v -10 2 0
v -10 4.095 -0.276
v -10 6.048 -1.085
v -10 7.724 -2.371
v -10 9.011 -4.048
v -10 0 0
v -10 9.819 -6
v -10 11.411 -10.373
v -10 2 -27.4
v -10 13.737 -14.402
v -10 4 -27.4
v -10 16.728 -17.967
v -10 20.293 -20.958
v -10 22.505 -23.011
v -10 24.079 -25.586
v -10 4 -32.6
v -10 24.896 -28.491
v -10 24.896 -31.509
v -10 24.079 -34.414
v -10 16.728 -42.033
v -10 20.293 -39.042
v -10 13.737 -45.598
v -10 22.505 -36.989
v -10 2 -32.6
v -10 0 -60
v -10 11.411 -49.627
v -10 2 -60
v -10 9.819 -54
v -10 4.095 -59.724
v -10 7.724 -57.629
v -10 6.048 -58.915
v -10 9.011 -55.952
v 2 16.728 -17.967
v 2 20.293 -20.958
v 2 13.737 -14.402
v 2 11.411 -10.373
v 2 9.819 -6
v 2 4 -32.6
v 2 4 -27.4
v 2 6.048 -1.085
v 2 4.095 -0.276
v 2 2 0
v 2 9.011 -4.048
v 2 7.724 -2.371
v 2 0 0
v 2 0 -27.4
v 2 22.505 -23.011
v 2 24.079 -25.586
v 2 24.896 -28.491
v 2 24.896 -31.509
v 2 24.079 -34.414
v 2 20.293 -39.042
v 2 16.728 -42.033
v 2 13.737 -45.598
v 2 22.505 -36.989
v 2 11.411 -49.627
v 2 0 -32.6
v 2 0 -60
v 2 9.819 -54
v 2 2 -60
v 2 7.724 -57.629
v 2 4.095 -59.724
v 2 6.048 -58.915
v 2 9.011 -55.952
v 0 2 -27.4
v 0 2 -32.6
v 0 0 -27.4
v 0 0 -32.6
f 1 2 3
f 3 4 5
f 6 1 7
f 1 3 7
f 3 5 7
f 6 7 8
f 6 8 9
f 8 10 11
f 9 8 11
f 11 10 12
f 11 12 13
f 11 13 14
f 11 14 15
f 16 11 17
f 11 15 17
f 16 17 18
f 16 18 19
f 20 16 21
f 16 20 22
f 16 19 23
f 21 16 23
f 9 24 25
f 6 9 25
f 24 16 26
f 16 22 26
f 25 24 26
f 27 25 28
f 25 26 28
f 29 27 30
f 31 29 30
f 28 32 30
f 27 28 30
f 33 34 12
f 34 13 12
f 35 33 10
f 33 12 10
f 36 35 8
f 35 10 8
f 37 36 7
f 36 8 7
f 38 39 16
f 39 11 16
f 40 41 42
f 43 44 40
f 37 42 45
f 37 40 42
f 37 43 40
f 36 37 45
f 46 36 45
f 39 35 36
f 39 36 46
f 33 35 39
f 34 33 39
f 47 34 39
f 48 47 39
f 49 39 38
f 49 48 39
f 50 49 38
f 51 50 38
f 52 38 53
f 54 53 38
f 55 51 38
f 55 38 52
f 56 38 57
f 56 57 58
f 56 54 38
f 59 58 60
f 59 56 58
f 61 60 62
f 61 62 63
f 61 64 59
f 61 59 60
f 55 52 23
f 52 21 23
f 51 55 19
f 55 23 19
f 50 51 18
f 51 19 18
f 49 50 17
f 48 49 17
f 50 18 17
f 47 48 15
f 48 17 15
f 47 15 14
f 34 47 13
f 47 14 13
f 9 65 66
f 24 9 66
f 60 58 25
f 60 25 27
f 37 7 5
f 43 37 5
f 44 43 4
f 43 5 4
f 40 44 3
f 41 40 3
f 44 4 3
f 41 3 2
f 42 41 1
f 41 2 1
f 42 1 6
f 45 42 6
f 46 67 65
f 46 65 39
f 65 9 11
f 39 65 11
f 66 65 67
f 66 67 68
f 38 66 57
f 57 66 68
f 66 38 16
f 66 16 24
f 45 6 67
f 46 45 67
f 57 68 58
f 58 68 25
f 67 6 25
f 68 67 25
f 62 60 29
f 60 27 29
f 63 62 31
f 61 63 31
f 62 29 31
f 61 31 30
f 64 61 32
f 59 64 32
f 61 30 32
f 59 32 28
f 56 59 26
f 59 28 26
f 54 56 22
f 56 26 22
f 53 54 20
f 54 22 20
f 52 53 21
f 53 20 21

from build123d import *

# Parameters (mm, degrees)
SKETCH1_W           = 5.2
SKETCH1_H           = 2
BOSS_EXTRUDE1_DEPTH = 10
BOSS_EXTRUDE2_DEPTH = 2


with BuildPart() as part:
    # Sketch1 → Boss-Extrude1 (new body)
    with BuildSketch(Plane(origin=(0, 0, 0), x_dir=(0, 0, -1), z_dir=(1, 0, 0))):
        with BuildLine():
            Line((0, 0), (60, 0))
            Line((60, 0), (60, 2))
            ThreePointArc((60, 2), (58.327156209, 6.928038895), (54, 9.819352237))
            ThreePointArc((54, 9.819352237), (45.597676291, 13.737420129), (39.042132847, 20.292963573))
            ThreePointArc((39.042132847, 20.292963573), (30, 25), (20.957867153, 20.292963573))
            ThreePointArc((20.957867153, 20.292963573), (14.402323709, 13.737420129), (6, 9.819352237))
            ThreePointArc((6, 9.819352237), (1.672843791, 6.928038895), (0, 2))
            Line((0, 2), (0, 0))
        make_face()
        with Locations((30, 3)):
            Rectangle(SKETCH1_W, SKETCH1_H, mode=Mode.SUBTRACT)
    extrude(amount=-BOSS_EXTRUDE1_DEPTH)

    # Sketch2 → Boss-Extrude2 (add)
    with BuildSketch(Plane(origin=(0, 0, 0), x_dir=(0, 0, -1), z_dir=(1, 0, 0))):
        with BuildLine():
            Line((0, 0), (27.4, 0))
            Line((27.4, 0), (27.4, 4))
            Line((27.4, 4), (32.6, 4))
            Line((32.6, 4), (32.6, 0))
            Line((32.6, 0), (60, 0))
            Line((60, 0), (60, 2))
            ThreePointArc((60, 2), (58.327156209, 6.928038895), (54, 9.819352237))
            ThreePointArc((54, 9.819352237), (45.597676291, 13.737420129), (39.042132847, 20.292963573))
            ThreePointArc((39.042132847, 20.292963573), (30, 25), (20.957867153, 20.292963573))
            ThreePointArc((20.957867153, 20.292963573), (14.402323709, 13.737420129), (6, 9.819352237))
            ThreePointArc((6, 9.819352237), (1.672843791, 6.928038895), (0, 2))
            Line((0, 2), (0, 0))
        make_face()
    extrude(amount=BOSS_EXTRUDE2_DEPTH)


solid = part.part
